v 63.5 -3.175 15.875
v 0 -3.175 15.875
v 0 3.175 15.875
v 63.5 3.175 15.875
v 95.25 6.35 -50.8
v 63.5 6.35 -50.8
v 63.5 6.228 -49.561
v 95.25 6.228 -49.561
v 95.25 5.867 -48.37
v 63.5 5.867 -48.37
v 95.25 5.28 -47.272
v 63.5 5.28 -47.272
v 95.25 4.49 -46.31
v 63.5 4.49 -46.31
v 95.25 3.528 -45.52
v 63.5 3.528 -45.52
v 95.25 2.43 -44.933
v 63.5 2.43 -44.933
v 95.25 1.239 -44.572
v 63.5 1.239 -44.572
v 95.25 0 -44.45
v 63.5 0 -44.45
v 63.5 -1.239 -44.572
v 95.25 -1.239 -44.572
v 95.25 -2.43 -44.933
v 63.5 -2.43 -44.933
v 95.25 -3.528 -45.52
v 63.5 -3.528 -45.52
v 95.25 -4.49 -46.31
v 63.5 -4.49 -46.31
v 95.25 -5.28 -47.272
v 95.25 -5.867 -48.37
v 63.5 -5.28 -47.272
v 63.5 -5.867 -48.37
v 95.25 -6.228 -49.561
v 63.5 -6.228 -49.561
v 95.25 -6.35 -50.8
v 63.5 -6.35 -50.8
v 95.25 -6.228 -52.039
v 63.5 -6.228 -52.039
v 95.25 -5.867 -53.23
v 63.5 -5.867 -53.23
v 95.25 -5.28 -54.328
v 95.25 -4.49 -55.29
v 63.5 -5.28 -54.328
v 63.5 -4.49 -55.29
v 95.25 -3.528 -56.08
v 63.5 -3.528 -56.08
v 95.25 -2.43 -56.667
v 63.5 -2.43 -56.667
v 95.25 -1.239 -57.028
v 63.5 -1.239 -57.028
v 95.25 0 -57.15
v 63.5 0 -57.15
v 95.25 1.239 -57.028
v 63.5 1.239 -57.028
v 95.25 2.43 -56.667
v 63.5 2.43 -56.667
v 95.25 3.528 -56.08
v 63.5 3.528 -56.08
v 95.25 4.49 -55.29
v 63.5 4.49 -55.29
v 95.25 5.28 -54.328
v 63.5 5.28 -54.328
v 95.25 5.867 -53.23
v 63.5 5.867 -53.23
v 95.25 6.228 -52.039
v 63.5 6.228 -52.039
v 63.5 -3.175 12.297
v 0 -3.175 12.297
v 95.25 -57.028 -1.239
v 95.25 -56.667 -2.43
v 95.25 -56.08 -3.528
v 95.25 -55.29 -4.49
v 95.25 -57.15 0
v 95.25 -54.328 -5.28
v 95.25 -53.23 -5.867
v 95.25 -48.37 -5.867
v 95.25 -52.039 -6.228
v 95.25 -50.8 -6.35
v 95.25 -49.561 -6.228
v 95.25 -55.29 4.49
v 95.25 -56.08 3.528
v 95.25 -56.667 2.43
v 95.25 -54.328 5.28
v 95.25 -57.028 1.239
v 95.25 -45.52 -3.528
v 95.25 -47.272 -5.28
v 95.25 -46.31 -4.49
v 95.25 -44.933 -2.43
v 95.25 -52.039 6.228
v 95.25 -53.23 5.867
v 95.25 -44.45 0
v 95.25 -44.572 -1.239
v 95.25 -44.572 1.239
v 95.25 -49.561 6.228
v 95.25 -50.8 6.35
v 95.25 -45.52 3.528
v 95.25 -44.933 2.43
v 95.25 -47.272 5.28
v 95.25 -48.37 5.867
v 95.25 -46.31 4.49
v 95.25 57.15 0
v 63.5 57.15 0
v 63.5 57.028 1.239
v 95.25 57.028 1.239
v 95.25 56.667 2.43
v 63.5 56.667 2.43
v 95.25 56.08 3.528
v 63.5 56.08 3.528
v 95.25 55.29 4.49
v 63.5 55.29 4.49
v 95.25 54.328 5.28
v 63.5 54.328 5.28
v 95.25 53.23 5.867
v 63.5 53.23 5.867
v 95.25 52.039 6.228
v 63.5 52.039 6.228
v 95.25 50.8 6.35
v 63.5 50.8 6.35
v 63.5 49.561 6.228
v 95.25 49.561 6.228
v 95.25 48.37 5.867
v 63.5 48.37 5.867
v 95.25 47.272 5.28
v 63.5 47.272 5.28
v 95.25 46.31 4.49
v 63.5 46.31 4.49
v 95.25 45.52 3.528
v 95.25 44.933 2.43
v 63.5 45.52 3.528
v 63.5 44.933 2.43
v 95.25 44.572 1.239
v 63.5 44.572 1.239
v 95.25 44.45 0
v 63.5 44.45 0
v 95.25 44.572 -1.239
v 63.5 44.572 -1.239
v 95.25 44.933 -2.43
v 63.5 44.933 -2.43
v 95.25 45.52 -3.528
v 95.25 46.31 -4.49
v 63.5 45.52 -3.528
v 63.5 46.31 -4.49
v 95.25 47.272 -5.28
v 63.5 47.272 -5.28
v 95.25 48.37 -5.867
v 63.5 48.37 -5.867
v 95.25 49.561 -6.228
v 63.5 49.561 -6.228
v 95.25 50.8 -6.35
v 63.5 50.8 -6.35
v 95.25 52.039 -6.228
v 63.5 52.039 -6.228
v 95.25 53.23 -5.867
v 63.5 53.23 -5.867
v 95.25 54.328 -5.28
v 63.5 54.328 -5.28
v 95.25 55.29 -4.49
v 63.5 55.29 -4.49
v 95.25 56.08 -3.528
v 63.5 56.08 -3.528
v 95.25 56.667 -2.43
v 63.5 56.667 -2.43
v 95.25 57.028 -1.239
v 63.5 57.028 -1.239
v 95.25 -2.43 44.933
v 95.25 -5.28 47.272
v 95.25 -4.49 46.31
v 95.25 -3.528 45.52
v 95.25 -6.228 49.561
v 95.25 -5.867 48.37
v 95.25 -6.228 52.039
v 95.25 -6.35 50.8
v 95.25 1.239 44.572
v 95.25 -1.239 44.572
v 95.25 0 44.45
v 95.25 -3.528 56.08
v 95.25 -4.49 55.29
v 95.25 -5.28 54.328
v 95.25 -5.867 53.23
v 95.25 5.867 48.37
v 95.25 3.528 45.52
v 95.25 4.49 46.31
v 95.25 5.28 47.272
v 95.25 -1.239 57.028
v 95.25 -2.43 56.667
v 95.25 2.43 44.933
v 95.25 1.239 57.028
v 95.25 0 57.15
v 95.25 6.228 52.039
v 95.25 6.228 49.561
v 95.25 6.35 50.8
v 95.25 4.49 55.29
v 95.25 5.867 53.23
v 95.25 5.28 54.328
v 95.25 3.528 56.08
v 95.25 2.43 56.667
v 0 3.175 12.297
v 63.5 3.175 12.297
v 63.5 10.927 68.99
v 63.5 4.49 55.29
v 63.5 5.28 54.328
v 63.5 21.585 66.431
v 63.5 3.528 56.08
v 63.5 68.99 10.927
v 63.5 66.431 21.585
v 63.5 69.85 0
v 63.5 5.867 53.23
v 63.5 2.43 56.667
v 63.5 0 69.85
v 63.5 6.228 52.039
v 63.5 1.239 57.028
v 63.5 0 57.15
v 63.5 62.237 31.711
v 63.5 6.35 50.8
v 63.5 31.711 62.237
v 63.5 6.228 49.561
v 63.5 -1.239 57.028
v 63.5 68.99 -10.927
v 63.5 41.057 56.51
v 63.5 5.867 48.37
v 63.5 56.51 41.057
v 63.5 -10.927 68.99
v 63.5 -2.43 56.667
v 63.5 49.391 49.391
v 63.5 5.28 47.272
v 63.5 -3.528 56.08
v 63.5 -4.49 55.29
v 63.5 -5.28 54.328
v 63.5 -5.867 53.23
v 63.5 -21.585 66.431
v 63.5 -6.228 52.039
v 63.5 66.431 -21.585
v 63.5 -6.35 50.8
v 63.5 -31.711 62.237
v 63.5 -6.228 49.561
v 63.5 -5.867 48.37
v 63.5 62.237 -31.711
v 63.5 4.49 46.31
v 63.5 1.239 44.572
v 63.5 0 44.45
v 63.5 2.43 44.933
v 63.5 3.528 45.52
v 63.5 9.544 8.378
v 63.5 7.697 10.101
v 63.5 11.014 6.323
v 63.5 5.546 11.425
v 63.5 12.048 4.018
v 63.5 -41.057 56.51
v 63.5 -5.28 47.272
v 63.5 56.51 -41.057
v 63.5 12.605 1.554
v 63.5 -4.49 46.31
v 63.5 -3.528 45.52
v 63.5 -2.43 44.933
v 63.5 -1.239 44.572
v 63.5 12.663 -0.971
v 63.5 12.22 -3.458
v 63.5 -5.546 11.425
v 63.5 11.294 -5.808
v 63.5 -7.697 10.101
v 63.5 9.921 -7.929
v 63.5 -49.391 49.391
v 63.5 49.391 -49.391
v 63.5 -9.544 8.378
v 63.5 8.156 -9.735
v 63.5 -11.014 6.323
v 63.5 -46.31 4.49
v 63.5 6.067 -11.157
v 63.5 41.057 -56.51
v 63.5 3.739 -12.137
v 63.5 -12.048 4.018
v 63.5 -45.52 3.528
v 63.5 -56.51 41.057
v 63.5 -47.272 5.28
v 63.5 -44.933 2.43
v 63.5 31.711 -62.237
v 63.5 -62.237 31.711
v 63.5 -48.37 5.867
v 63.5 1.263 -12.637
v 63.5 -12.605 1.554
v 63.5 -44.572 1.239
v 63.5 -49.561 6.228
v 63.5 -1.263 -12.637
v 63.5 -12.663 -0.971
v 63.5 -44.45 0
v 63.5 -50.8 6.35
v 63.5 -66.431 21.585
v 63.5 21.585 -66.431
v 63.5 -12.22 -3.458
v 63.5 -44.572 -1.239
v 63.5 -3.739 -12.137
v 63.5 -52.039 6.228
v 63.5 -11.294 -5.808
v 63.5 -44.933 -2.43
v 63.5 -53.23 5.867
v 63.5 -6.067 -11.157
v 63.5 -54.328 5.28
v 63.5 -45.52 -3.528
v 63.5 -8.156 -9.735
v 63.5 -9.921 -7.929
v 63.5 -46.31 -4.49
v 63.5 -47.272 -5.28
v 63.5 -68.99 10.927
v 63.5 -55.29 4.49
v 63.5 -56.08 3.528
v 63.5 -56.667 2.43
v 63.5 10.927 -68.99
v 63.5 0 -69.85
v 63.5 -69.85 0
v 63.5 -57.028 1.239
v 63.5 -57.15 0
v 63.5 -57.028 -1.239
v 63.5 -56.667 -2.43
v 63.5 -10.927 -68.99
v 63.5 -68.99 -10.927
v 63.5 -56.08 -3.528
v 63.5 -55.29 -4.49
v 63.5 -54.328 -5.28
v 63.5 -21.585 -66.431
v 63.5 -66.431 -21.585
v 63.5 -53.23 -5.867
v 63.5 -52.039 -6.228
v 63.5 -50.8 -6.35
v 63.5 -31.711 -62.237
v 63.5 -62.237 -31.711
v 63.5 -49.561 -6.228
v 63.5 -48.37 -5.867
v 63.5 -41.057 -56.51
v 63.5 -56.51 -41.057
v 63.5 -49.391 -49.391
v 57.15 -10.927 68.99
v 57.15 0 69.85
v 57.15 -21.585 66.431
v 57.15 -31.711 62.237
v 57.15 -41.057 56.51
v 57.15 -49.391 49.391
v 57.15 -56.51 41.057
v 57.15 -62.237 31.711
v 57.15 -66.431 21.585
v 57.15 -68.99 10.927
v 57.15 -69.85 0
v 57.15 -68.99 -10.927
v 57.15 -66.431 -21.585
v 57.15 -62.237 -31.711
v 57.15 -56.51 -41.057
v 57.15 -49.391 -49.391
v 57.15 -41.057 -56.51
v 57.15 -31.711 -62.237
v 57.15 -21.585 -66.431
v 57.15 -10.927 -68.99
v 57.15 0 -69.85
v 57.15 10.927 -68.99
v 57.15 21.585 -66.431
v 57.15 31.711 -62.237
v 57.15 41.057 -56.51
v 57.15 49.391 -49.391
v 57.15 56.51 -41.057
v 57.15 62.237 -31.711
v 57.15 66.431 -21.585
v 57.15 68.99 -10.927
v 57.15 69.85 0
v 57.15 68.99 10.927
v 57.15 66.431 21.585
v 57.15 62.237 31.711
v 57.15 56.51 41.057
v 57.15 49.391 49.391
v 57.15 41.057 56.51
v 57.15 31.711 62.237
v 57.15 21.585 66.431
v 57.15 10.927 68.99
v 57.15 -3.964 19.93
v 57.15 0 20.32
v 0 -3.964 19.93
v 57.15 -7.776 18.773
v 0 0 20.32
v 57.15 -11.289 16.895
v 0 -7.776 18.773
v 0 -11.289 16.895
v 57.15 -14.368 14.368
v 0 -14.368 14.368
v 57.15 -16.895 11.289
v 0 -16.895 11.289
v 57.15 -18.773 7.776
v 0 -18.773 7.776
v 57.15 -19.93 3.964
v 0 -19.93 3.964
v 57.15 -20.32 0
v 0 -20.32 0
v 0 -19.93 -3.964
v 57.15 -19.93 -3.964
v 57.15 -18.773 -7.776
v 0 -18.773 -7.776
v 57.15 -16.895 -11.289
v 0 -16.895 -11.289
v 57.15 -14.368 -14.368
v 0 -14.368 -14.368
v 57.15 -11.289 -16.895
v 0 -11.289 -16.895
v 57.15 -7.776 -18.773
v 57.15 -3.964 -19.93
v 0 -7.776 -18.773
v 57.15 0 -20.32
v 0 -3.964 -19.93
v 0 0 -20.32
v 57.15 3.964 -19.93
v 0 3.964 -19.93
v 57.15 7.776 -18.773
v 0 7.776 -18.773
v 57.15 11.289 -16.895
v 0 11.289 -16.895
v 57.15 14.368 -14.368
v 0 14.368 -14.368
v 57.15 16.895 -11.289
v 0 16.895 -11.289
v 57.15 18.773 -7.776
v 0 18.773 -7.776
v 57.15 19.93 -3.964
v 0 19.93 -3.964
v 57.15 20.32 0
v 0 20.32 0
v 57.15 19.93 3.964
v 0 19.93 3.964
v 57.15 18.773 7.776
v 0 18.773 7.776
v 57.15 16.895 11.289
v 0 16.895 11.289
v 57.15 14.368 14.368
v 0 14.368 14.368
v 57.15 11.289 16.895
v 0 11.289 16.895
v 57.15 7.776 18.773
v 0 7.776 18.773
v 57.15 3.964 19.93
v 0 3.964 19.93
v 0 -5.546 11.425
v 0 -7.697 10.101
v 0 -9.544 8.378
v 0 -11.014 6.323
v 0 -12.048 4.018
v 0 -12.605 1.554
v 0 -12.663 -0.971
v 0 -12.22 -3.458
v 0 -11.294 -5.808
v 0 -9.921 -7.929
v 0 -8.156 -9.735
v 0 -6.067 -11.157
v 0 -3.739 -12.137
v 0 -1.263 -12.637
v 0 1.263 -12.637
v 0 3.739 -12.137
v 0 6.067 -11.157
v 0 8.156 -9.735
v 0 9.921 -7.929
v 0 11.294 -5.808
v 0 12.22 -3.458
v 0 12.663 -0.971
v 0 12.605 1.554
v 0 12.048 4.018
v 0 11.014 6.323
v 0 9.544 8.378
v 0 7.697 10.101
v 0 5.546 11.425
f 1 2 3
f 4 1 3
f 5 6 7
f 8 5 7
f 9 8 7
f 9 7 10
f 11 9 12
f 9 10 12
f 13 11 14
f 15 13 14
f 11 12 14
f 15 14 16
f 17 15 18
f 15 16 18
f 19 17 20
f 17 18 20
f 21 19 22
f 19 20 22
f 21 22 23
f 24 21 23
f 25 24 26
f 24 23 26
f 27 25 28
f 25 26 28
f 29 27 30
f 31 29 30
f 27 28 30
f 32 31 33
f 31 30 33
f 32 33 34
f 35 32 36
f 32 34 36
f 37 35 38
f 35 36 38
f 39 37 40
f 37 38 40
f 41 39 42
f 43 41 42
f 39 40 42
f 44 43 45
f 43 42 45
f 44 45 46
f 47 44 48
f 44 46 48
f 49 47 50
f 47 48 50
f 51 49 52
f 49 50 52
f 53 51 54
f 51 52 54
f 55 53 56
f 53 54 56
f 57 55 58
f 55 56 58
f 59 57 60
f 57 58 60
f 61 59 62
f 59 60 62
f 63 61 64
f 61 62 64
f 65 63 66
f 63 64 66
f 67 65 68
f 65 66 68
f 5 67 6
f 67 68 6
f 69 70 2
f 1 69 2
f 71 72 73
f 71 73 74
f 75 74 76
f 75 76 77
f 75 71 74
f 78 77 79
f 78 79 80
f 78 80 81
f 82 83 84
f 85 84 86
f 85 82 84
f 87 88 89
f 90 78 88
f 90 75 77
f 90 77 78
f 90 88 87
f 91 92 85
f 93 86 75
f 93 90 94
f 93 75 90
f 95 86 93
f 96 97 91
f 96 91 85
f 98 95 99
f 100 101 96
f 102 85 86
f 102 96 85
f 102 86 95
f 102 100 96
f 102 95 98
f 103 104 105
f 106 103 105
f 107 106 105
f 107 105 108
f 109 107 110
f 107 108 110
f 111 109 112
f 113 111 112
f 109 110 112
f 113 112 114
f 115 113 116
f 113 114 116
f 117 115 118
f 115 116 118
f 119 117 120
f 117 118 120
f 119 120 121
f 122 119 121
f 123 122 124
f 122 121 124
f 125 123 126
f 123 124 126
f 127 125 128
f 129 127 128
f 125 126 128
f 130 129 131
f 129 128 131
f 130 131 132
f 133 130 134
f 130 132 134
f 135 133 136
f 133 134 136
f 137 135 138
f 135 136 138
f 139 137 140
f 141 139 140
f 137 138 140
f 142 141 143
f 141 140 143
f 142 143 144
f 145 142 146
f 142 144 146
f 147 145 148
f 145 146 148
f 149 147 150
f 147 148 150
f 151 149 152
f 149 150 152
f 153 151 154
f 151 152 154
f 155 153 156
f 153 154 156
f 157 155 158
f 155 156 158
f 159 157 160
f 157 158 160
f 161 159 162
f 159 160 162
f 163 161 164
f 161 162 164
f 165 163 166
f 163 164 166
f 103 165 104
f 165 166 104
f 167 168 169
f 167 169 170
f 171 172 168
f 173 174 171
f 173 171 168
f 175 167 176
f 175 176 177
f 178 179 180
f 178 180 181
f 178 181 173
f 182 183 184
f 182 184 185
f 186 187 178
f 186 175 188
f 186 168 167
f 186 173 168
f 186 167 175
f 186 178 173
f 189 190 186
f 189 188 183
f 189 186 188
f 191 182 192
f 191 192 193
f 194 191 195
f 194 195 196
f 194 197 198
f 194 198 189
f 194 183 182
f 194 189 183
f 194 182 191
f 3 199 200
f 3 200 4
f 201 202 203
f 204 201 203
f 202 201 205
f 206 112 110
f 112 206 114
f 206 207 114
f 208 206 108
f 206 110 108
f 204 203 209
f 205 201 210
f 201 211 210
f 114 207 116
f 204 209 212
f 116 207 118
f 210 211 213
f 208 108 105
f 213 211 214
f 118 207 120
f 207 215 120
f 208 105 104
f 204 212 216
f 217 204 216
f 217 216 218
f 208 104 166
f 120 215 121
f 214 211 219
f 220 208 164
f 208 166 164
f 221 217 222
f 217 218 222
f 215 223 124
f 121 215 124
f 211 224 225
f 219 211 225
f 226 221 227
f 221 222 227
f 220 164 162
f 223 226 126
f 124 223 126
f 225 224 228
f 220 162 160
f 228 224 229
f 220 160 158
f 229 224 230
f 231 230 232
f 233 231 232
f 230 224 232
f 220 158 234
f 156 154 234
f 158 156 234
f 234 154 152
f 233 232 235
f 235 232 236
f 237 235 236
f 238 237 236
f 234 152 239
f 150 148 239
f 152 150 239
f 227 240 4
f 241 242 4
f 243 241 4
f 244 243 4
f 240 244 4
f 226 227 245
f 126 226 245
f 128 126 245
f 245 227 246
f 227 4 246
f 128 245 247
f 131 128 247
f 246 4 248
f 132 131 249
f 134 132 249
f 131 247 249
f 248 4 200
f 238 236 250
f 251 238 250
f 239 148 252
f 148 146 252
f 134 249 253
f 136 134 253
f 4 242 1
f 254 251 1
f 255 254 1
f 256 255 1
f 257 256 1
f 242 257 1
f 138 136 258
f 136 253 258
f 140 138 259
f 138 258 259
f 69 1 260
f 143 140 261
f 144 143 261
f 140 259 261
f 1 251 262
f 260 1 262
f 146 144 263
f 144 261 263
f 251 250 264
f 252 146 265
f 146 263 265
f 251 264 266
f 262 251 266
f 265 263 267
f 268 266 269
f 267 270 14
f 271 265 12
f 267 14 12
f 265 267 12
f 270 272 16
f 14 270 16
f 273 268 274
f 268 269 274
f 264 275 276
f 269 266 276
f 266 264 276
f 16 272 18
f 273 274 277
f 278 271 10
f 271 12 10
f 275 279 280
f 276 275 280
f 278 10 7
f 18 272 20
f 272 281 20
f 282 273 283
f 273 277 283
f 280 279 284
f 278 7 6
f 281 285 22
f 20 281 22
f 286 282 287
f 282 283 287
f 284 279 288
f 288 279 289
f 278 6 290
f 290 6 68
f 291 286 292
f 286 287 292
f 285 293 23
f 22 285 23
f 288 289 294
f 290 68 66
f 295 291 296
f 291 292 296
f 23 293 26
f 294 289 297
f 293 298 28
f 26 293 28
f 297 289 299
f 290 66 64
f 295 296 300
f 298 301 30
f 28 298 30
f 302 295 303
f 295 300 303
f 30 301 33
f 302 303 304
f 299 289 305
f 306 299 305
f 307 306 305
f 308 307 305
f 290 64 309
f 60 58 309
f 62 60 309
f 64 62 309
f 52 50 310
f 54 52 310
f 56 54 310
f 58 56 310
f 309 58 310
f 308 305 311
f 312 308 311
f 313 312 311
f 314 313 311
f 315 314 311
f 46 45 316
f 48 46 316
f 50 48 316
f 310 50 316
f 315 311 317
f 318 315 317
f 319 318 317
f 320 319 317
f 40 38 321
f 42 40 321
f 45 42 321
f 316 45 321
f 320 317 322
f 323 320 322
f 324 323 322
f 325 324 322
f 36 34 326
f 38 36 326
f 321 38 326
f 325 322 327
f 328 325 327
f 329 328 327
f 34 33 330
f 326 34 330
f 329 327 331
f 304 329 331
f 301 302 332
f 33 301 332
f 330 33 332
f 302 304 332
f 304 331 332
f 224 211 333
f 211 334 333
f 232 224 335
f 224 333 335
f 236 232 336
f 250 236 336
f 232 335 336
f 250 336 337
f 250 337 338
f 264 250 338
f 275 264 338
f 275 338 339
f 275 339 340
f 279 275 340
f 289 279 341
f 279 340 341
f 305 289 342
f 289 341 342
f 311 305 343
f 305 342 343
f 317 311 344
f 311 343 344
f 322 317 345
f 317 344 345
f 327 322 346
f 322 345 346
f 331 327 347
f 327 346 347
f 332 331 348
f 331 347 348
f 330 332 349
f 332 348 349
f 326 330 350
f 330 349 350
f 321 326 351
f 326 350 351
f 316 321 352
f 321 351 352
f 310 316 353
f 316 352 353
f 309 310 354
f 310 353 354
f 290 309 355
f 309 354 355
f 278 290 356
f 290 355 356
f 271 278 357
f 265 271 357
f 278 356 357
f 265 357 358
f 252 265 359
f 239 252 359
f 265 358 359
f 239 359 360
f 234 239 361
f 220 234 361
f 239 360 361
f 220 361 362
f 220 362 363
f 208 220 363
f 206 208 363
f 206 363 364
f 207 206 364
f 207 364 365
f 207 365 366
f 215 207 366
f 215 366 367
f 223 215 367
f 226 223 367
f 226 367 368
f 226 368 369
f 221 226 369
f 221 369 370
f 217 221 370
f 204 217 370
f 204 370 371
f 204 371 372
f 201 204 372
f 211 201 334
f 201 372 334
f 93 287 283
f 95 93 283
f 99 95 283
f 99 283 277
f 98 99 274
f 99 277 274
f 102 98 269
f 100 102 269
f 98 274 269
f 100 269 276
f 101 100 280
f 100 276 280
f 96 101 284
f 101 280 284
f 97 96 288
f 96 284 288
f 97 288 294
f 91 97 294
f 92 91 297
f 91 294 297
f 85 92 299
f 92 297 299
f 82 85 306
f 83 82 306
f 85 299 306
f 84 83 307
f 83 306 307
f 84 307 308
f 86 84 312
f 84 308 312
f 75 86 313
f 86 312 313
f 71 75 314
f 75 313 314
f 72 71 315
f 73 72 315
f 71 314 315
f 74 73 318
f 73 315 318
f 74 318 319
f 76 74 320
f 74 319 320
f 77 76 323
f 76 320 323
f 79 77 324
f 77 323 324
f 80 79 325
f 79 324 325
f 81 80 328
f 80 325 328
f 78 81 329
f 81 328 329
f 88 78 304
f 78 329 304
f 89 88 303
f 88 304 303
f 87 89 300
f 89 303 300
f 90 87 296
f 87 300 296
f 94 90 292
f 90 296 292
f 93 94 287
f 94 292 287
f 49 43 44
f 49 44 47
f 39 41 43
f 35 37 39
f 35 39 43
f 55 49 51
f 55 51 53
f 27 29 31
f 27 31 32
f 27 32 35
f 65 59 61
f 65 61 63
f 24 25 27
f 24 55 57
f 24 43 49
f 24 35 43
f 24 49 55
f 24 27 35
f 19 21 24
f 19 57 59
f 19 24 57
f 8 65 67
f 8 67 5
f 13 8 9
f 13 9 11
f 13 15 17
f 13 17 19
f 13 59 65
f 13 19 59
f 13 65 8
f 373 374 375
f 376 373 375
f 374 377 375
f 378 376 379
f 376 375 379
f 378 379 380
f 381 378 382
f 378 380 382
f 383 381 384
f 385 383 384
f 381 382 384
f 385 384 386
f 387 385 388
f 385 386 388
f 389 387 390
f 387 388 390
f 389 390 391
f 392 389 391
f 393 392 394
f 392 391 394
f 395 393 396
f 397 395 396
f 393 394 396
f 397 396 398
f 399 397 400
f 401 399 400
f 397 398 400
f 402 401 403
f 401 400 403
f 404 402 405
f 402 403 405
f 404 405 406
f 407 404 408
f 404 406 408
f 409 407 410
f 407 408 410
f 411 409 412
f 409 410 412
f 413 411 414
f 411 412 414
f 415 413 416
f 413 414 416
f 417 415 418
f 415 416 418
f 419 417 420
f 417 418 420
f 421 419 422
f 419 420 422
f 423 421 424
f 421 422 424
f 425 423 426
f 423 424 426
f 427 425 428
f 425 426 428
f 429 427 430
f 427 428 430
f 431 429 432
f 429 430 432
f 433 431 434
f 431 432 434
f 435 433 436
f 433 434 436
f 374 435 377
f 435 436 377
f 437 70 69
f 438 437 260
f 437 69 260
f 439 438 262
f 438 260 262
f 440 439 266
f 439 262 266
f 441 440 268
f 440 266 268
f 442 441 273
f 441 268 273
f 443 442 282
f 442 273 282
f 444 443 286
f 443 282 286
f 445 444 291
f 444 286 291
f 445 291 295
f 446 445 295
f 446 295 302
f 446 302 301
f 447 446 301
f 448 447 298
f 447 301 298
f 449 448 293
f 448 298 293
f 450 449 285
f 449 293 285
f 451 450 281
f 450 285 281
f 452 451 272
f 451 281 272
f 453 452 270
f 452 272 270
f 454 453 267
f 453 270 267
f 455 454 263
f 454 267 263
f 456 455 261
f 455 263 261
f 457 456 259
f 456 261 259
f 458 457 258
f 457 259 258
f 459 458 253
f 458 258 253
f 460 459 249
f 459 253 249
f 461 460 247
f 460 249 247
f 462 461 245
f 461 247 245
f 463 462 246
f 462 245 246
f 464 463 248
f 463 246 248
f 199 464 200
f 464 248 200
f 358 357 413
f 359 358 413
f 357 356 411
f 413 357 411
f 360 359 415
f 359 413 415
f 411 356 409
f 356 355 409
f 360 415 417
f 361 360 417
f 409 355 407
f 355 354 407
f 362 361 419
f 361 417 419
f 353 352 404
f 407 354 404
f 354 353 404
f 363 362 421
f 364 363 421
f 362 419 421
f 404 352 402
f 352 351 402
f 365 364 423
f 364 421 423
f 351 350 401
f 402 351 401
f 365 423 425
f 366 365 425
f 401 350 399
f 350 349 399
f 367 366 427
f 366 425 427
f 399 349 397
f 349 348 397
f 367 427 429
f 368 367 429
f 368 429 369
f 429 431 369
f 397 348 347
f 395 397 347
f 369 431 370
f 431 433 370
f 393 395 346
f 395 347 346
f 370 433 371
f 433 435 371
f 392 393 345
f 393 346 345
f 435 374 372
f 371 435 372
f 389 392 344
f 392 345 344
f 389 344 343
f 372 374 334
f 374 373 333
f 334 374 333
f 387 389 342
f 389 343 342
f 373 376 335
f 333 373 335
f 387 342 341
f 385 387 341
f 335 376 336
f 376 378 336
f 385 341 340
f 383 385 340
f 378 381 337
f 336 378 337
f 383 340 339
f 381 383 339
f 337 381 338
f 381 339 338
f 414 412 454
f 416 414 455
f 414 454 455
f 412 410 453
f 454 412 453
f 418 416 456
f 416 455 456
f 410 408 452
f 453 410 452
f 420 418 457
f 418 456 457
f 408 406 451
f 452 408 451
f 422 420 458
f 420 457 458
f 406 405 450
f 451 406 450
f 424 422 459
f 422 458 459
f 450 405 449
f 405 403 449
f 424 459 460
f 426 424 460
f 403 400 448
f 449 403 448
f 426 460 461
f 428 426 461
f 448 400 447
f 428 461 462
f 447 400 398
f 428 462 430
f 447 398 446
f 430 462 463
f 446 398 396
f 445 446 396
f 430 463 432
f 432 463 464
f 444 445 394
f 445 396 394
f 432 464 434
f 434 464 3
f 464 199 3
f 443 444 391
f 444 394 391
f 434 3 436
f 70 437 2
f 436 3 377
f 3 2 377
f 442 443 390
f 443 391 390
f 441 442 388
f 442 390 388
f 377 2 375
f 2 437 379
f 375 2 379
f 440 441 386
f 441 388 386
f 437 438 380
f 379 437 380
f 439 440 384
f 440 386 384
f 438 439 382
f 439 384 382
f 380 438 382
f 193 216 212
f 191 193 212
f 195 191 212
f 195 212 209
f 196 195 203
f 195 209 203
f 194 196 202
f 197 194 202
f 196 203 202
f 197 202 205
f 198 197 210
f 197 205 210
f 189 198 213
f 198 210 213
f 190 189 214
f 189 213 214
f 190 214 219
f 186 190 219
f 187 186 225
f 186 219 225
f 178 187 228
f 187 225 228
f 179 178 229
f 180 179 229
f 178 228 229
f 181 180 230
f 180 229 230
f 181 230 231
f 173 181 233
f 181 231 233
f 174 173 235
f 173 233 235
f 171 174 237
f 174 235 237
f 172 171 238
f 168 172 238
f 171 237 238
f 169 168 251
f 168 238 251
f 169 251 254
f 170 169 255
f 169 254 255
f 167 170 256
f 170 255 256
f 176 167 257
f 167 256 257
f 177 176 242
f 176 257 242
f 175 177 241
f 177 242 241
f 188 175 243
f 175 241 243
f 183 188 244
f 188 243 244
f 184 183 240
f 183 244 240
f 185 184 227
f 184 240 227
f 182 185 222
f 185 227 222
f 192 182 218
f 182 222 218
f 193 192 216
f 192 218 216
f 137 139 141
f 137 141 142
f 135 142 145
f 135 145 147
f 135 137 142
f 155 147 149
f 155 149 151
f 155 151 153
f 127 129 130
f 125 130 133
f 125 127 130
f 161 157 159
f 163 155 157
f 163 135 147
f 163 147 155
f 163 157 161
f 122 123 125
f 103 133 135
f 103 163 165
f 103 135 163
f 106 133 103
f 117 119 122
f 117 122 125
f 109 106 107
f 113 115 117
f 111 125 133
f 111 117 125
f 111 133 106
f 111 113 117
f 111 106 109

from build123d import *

# Parameters (mm, degrees)
F2_W     = 6.35
F2_H     = 6.35
F3_DEPTH = 63.501
F4_R     = 6.35
F5_DEPTH = 31.75


with BuildPart() as f1:
    # F0 (on Front) → F1 (revolve)
    with BuildSketch(Plane.XZ):
        Polygon((0, 20.32), (0, 12.7), (63.5, 12.7), (63.5, 69.85), (57.15, 69.85), (57.15, 20.32), align=None)
    revolve(axis=Axis((31.75, 0, 0), (1, 0, 0)))

    # F2 (on Right) → F3 (cut, through all)
    with BuildSketch(Plane.YZ):
        with Locations((0, 12.7)):
            Rectangle(F2_W, F2_H)
    extrude(amount=F3_DEPTH, mode=Mode.SUBTRACT)

    # F4 (on face) → F5 (join)
    with BuildSketch(Plane.YZ.offset(63.5)):
        with Locations((0, 50.8)):
            Circle(F4_R)
        with Locations((-50.8, 0)):
            Circle(F4_R)
        with Locations((0, -50.8)):
            Circle(F4_R)
        with Locations((50.8, 0)):
            Circle(F4_R)
    extrude(amount=F5_DEPTH)


solid = f1.part
